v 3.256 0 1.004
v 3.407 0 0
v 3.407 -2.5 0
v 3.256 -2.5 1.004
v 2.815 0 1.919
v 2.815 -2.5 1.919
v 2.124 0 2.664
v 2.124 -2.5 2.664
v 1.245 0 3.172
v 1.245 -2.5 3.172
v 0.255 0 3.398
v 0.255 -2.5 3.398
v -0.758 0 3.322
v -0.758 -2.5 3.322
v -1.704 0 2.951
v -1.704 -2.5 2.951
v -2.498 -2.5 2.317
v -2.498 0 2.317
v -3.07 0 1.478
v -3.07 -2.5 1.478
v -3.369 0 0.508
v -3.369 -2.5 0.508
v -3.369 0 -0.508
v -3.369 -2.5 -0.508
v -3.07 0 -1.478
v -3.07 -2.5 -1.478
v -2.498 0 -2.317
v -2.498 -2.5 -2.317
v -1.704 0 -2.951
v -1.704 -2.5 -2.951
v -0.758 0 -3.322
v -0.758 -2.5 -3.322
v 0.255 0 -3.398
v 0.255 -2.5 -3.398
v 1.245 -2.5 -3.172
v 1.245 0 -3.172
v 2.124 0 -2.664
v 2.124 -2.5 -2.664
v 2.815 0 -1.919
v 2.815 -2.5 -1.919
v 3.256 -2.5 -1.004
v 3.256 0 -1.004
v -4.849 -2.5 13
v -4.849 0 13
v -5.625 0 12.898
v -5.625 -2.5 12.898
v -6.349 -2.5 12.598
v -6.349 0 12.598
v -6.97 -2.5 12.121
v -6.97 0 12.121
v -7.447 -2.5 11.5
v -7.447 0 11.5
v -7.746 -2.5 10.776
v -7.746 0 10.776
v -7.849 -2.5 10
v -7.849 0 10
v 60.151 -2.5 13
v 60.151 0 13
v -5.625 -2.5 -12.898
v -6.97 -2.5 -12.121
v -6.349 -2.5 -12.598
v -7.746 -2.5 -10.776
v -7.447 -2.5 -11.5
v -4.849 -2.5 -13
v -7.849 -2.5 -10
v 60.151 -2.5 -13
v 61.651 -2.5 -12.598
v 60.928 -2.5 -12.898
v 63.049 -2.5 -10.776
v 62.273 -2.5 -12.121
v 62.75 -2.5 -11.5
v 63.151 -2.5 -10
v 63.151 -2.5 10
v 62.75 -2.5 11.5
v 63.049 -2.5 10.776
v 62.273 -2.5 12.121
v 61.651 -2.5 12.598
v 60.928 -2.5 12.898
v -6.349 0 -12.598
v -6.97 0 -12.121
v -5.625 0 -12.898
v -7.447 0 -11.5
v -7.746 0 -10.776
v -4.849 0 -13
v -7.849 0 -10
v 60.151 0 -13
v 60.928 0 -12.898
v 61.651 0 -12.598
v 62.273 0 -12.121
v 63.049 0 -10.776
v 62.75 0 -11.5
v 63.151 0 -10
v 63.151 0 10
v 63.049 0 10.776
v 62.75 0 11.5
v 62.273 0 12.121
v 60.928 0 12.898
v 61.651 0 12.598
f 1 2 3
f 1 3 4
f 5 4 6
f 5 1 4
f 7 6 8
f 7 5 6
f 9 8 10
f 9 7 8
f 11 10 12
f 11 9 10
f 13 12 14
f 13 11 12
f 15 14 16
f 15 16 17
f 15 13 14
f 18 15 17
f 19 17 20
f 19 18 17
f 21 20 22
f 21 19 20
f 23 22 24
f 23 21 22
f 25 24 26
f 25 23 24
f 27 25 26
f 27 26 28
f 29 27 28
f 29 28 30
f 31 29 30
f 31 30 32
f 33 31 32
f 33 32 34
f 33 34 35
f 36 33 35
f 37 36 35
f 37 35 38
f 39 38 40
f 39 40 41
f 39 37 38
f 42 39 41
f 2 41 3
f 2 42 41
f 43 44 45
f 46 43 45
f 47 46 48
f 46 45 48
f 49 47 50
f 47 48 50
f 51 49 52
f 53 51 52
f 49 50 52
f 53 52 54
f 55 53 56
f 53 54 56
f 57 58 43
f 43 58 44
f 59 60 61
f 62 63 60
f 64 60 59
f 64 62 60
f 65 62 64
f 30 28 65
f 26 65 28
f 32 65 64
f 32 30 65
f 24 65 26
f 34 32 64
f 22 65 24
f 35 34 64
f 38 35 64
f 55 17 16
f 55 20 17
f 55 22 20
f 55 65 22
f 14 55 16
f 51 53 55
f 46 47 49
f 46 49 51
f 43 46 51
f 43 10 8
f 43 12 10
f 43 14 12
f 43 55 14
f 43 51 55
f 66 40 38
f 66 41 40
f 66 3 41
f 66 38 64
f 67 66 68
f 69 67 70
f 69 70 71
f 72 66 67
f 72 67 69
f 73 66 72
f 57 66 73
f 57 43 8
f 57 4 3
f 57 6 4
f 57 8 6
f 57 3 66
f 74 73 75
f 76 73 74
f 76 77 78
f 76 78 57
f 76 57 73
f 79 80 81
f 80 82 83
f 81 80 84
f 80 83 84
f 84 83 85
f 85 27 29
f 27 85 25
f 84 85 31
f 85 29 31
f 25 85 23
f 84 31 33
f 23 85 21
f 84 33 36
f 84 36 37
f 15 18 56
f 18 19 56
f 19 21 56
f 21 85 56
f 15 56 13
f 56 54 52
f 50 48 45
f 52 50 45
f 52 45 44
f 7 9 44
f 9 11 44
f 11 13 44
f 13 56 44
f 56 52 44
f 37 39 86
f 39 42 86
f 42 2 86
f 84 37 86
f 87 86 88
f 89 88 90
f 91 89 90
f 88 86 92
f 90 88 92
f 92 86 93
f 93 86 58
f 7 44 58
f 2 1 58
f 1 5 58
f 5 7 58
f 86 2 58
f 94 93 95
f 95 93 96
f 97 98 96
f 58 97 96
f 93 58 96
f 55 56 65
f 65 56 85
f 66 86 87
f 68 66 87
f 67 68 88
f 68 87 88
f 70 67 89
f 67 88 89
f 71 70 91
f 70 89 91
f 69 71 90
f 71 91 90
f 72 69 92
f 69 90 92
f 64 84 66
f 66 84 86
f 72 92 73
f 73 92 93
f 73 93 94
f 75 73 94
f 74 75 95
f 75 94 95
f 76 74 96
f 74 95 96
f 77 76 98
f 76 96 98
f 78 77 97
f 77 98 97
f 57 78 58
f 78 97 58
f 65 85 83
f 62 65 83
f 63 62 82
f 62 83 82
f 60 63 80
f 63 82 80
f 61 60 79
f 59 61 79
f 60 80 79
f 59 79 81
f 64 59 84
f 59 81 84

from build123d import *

# Parameters (mm, degrees)
F0_R     = 3.40703
F1_DEPTH = 2.5


with BuildPart() as f1:
    # F0 (on Front) → F1 (new body)
    with BuildSketch(Plane.XZ):
        with BuildLine():
            Line((60.151453, 13), (-4.848547, 13))
            ThreePointArc((-4.848547, 13), (-6.969868, 12.12132), (-7.848547, 10))
            Line((-7.848547, 10), (-7.848547, -10))
            ThreePointArc((-7.848547, -10), (-6.969868, -12.12132), (-4.848547, -13))
            Line((-4.848547, -13), (60.151453, -13))
            ThreePointArc((60.151453, -13), (62.272773, -12.12132), (63.151453, -10))
            Line((63.151453, -10), (63.151453, 10))
            ThreePointArc((63.151453, 10), (62.272773, 12.12132), (60.151453, 13))
        make_face()
        Circle(F0_R, mode=Mode.SUBTRACT)
    extrude(amount=F1_DEPTH)


solid = f1.part
